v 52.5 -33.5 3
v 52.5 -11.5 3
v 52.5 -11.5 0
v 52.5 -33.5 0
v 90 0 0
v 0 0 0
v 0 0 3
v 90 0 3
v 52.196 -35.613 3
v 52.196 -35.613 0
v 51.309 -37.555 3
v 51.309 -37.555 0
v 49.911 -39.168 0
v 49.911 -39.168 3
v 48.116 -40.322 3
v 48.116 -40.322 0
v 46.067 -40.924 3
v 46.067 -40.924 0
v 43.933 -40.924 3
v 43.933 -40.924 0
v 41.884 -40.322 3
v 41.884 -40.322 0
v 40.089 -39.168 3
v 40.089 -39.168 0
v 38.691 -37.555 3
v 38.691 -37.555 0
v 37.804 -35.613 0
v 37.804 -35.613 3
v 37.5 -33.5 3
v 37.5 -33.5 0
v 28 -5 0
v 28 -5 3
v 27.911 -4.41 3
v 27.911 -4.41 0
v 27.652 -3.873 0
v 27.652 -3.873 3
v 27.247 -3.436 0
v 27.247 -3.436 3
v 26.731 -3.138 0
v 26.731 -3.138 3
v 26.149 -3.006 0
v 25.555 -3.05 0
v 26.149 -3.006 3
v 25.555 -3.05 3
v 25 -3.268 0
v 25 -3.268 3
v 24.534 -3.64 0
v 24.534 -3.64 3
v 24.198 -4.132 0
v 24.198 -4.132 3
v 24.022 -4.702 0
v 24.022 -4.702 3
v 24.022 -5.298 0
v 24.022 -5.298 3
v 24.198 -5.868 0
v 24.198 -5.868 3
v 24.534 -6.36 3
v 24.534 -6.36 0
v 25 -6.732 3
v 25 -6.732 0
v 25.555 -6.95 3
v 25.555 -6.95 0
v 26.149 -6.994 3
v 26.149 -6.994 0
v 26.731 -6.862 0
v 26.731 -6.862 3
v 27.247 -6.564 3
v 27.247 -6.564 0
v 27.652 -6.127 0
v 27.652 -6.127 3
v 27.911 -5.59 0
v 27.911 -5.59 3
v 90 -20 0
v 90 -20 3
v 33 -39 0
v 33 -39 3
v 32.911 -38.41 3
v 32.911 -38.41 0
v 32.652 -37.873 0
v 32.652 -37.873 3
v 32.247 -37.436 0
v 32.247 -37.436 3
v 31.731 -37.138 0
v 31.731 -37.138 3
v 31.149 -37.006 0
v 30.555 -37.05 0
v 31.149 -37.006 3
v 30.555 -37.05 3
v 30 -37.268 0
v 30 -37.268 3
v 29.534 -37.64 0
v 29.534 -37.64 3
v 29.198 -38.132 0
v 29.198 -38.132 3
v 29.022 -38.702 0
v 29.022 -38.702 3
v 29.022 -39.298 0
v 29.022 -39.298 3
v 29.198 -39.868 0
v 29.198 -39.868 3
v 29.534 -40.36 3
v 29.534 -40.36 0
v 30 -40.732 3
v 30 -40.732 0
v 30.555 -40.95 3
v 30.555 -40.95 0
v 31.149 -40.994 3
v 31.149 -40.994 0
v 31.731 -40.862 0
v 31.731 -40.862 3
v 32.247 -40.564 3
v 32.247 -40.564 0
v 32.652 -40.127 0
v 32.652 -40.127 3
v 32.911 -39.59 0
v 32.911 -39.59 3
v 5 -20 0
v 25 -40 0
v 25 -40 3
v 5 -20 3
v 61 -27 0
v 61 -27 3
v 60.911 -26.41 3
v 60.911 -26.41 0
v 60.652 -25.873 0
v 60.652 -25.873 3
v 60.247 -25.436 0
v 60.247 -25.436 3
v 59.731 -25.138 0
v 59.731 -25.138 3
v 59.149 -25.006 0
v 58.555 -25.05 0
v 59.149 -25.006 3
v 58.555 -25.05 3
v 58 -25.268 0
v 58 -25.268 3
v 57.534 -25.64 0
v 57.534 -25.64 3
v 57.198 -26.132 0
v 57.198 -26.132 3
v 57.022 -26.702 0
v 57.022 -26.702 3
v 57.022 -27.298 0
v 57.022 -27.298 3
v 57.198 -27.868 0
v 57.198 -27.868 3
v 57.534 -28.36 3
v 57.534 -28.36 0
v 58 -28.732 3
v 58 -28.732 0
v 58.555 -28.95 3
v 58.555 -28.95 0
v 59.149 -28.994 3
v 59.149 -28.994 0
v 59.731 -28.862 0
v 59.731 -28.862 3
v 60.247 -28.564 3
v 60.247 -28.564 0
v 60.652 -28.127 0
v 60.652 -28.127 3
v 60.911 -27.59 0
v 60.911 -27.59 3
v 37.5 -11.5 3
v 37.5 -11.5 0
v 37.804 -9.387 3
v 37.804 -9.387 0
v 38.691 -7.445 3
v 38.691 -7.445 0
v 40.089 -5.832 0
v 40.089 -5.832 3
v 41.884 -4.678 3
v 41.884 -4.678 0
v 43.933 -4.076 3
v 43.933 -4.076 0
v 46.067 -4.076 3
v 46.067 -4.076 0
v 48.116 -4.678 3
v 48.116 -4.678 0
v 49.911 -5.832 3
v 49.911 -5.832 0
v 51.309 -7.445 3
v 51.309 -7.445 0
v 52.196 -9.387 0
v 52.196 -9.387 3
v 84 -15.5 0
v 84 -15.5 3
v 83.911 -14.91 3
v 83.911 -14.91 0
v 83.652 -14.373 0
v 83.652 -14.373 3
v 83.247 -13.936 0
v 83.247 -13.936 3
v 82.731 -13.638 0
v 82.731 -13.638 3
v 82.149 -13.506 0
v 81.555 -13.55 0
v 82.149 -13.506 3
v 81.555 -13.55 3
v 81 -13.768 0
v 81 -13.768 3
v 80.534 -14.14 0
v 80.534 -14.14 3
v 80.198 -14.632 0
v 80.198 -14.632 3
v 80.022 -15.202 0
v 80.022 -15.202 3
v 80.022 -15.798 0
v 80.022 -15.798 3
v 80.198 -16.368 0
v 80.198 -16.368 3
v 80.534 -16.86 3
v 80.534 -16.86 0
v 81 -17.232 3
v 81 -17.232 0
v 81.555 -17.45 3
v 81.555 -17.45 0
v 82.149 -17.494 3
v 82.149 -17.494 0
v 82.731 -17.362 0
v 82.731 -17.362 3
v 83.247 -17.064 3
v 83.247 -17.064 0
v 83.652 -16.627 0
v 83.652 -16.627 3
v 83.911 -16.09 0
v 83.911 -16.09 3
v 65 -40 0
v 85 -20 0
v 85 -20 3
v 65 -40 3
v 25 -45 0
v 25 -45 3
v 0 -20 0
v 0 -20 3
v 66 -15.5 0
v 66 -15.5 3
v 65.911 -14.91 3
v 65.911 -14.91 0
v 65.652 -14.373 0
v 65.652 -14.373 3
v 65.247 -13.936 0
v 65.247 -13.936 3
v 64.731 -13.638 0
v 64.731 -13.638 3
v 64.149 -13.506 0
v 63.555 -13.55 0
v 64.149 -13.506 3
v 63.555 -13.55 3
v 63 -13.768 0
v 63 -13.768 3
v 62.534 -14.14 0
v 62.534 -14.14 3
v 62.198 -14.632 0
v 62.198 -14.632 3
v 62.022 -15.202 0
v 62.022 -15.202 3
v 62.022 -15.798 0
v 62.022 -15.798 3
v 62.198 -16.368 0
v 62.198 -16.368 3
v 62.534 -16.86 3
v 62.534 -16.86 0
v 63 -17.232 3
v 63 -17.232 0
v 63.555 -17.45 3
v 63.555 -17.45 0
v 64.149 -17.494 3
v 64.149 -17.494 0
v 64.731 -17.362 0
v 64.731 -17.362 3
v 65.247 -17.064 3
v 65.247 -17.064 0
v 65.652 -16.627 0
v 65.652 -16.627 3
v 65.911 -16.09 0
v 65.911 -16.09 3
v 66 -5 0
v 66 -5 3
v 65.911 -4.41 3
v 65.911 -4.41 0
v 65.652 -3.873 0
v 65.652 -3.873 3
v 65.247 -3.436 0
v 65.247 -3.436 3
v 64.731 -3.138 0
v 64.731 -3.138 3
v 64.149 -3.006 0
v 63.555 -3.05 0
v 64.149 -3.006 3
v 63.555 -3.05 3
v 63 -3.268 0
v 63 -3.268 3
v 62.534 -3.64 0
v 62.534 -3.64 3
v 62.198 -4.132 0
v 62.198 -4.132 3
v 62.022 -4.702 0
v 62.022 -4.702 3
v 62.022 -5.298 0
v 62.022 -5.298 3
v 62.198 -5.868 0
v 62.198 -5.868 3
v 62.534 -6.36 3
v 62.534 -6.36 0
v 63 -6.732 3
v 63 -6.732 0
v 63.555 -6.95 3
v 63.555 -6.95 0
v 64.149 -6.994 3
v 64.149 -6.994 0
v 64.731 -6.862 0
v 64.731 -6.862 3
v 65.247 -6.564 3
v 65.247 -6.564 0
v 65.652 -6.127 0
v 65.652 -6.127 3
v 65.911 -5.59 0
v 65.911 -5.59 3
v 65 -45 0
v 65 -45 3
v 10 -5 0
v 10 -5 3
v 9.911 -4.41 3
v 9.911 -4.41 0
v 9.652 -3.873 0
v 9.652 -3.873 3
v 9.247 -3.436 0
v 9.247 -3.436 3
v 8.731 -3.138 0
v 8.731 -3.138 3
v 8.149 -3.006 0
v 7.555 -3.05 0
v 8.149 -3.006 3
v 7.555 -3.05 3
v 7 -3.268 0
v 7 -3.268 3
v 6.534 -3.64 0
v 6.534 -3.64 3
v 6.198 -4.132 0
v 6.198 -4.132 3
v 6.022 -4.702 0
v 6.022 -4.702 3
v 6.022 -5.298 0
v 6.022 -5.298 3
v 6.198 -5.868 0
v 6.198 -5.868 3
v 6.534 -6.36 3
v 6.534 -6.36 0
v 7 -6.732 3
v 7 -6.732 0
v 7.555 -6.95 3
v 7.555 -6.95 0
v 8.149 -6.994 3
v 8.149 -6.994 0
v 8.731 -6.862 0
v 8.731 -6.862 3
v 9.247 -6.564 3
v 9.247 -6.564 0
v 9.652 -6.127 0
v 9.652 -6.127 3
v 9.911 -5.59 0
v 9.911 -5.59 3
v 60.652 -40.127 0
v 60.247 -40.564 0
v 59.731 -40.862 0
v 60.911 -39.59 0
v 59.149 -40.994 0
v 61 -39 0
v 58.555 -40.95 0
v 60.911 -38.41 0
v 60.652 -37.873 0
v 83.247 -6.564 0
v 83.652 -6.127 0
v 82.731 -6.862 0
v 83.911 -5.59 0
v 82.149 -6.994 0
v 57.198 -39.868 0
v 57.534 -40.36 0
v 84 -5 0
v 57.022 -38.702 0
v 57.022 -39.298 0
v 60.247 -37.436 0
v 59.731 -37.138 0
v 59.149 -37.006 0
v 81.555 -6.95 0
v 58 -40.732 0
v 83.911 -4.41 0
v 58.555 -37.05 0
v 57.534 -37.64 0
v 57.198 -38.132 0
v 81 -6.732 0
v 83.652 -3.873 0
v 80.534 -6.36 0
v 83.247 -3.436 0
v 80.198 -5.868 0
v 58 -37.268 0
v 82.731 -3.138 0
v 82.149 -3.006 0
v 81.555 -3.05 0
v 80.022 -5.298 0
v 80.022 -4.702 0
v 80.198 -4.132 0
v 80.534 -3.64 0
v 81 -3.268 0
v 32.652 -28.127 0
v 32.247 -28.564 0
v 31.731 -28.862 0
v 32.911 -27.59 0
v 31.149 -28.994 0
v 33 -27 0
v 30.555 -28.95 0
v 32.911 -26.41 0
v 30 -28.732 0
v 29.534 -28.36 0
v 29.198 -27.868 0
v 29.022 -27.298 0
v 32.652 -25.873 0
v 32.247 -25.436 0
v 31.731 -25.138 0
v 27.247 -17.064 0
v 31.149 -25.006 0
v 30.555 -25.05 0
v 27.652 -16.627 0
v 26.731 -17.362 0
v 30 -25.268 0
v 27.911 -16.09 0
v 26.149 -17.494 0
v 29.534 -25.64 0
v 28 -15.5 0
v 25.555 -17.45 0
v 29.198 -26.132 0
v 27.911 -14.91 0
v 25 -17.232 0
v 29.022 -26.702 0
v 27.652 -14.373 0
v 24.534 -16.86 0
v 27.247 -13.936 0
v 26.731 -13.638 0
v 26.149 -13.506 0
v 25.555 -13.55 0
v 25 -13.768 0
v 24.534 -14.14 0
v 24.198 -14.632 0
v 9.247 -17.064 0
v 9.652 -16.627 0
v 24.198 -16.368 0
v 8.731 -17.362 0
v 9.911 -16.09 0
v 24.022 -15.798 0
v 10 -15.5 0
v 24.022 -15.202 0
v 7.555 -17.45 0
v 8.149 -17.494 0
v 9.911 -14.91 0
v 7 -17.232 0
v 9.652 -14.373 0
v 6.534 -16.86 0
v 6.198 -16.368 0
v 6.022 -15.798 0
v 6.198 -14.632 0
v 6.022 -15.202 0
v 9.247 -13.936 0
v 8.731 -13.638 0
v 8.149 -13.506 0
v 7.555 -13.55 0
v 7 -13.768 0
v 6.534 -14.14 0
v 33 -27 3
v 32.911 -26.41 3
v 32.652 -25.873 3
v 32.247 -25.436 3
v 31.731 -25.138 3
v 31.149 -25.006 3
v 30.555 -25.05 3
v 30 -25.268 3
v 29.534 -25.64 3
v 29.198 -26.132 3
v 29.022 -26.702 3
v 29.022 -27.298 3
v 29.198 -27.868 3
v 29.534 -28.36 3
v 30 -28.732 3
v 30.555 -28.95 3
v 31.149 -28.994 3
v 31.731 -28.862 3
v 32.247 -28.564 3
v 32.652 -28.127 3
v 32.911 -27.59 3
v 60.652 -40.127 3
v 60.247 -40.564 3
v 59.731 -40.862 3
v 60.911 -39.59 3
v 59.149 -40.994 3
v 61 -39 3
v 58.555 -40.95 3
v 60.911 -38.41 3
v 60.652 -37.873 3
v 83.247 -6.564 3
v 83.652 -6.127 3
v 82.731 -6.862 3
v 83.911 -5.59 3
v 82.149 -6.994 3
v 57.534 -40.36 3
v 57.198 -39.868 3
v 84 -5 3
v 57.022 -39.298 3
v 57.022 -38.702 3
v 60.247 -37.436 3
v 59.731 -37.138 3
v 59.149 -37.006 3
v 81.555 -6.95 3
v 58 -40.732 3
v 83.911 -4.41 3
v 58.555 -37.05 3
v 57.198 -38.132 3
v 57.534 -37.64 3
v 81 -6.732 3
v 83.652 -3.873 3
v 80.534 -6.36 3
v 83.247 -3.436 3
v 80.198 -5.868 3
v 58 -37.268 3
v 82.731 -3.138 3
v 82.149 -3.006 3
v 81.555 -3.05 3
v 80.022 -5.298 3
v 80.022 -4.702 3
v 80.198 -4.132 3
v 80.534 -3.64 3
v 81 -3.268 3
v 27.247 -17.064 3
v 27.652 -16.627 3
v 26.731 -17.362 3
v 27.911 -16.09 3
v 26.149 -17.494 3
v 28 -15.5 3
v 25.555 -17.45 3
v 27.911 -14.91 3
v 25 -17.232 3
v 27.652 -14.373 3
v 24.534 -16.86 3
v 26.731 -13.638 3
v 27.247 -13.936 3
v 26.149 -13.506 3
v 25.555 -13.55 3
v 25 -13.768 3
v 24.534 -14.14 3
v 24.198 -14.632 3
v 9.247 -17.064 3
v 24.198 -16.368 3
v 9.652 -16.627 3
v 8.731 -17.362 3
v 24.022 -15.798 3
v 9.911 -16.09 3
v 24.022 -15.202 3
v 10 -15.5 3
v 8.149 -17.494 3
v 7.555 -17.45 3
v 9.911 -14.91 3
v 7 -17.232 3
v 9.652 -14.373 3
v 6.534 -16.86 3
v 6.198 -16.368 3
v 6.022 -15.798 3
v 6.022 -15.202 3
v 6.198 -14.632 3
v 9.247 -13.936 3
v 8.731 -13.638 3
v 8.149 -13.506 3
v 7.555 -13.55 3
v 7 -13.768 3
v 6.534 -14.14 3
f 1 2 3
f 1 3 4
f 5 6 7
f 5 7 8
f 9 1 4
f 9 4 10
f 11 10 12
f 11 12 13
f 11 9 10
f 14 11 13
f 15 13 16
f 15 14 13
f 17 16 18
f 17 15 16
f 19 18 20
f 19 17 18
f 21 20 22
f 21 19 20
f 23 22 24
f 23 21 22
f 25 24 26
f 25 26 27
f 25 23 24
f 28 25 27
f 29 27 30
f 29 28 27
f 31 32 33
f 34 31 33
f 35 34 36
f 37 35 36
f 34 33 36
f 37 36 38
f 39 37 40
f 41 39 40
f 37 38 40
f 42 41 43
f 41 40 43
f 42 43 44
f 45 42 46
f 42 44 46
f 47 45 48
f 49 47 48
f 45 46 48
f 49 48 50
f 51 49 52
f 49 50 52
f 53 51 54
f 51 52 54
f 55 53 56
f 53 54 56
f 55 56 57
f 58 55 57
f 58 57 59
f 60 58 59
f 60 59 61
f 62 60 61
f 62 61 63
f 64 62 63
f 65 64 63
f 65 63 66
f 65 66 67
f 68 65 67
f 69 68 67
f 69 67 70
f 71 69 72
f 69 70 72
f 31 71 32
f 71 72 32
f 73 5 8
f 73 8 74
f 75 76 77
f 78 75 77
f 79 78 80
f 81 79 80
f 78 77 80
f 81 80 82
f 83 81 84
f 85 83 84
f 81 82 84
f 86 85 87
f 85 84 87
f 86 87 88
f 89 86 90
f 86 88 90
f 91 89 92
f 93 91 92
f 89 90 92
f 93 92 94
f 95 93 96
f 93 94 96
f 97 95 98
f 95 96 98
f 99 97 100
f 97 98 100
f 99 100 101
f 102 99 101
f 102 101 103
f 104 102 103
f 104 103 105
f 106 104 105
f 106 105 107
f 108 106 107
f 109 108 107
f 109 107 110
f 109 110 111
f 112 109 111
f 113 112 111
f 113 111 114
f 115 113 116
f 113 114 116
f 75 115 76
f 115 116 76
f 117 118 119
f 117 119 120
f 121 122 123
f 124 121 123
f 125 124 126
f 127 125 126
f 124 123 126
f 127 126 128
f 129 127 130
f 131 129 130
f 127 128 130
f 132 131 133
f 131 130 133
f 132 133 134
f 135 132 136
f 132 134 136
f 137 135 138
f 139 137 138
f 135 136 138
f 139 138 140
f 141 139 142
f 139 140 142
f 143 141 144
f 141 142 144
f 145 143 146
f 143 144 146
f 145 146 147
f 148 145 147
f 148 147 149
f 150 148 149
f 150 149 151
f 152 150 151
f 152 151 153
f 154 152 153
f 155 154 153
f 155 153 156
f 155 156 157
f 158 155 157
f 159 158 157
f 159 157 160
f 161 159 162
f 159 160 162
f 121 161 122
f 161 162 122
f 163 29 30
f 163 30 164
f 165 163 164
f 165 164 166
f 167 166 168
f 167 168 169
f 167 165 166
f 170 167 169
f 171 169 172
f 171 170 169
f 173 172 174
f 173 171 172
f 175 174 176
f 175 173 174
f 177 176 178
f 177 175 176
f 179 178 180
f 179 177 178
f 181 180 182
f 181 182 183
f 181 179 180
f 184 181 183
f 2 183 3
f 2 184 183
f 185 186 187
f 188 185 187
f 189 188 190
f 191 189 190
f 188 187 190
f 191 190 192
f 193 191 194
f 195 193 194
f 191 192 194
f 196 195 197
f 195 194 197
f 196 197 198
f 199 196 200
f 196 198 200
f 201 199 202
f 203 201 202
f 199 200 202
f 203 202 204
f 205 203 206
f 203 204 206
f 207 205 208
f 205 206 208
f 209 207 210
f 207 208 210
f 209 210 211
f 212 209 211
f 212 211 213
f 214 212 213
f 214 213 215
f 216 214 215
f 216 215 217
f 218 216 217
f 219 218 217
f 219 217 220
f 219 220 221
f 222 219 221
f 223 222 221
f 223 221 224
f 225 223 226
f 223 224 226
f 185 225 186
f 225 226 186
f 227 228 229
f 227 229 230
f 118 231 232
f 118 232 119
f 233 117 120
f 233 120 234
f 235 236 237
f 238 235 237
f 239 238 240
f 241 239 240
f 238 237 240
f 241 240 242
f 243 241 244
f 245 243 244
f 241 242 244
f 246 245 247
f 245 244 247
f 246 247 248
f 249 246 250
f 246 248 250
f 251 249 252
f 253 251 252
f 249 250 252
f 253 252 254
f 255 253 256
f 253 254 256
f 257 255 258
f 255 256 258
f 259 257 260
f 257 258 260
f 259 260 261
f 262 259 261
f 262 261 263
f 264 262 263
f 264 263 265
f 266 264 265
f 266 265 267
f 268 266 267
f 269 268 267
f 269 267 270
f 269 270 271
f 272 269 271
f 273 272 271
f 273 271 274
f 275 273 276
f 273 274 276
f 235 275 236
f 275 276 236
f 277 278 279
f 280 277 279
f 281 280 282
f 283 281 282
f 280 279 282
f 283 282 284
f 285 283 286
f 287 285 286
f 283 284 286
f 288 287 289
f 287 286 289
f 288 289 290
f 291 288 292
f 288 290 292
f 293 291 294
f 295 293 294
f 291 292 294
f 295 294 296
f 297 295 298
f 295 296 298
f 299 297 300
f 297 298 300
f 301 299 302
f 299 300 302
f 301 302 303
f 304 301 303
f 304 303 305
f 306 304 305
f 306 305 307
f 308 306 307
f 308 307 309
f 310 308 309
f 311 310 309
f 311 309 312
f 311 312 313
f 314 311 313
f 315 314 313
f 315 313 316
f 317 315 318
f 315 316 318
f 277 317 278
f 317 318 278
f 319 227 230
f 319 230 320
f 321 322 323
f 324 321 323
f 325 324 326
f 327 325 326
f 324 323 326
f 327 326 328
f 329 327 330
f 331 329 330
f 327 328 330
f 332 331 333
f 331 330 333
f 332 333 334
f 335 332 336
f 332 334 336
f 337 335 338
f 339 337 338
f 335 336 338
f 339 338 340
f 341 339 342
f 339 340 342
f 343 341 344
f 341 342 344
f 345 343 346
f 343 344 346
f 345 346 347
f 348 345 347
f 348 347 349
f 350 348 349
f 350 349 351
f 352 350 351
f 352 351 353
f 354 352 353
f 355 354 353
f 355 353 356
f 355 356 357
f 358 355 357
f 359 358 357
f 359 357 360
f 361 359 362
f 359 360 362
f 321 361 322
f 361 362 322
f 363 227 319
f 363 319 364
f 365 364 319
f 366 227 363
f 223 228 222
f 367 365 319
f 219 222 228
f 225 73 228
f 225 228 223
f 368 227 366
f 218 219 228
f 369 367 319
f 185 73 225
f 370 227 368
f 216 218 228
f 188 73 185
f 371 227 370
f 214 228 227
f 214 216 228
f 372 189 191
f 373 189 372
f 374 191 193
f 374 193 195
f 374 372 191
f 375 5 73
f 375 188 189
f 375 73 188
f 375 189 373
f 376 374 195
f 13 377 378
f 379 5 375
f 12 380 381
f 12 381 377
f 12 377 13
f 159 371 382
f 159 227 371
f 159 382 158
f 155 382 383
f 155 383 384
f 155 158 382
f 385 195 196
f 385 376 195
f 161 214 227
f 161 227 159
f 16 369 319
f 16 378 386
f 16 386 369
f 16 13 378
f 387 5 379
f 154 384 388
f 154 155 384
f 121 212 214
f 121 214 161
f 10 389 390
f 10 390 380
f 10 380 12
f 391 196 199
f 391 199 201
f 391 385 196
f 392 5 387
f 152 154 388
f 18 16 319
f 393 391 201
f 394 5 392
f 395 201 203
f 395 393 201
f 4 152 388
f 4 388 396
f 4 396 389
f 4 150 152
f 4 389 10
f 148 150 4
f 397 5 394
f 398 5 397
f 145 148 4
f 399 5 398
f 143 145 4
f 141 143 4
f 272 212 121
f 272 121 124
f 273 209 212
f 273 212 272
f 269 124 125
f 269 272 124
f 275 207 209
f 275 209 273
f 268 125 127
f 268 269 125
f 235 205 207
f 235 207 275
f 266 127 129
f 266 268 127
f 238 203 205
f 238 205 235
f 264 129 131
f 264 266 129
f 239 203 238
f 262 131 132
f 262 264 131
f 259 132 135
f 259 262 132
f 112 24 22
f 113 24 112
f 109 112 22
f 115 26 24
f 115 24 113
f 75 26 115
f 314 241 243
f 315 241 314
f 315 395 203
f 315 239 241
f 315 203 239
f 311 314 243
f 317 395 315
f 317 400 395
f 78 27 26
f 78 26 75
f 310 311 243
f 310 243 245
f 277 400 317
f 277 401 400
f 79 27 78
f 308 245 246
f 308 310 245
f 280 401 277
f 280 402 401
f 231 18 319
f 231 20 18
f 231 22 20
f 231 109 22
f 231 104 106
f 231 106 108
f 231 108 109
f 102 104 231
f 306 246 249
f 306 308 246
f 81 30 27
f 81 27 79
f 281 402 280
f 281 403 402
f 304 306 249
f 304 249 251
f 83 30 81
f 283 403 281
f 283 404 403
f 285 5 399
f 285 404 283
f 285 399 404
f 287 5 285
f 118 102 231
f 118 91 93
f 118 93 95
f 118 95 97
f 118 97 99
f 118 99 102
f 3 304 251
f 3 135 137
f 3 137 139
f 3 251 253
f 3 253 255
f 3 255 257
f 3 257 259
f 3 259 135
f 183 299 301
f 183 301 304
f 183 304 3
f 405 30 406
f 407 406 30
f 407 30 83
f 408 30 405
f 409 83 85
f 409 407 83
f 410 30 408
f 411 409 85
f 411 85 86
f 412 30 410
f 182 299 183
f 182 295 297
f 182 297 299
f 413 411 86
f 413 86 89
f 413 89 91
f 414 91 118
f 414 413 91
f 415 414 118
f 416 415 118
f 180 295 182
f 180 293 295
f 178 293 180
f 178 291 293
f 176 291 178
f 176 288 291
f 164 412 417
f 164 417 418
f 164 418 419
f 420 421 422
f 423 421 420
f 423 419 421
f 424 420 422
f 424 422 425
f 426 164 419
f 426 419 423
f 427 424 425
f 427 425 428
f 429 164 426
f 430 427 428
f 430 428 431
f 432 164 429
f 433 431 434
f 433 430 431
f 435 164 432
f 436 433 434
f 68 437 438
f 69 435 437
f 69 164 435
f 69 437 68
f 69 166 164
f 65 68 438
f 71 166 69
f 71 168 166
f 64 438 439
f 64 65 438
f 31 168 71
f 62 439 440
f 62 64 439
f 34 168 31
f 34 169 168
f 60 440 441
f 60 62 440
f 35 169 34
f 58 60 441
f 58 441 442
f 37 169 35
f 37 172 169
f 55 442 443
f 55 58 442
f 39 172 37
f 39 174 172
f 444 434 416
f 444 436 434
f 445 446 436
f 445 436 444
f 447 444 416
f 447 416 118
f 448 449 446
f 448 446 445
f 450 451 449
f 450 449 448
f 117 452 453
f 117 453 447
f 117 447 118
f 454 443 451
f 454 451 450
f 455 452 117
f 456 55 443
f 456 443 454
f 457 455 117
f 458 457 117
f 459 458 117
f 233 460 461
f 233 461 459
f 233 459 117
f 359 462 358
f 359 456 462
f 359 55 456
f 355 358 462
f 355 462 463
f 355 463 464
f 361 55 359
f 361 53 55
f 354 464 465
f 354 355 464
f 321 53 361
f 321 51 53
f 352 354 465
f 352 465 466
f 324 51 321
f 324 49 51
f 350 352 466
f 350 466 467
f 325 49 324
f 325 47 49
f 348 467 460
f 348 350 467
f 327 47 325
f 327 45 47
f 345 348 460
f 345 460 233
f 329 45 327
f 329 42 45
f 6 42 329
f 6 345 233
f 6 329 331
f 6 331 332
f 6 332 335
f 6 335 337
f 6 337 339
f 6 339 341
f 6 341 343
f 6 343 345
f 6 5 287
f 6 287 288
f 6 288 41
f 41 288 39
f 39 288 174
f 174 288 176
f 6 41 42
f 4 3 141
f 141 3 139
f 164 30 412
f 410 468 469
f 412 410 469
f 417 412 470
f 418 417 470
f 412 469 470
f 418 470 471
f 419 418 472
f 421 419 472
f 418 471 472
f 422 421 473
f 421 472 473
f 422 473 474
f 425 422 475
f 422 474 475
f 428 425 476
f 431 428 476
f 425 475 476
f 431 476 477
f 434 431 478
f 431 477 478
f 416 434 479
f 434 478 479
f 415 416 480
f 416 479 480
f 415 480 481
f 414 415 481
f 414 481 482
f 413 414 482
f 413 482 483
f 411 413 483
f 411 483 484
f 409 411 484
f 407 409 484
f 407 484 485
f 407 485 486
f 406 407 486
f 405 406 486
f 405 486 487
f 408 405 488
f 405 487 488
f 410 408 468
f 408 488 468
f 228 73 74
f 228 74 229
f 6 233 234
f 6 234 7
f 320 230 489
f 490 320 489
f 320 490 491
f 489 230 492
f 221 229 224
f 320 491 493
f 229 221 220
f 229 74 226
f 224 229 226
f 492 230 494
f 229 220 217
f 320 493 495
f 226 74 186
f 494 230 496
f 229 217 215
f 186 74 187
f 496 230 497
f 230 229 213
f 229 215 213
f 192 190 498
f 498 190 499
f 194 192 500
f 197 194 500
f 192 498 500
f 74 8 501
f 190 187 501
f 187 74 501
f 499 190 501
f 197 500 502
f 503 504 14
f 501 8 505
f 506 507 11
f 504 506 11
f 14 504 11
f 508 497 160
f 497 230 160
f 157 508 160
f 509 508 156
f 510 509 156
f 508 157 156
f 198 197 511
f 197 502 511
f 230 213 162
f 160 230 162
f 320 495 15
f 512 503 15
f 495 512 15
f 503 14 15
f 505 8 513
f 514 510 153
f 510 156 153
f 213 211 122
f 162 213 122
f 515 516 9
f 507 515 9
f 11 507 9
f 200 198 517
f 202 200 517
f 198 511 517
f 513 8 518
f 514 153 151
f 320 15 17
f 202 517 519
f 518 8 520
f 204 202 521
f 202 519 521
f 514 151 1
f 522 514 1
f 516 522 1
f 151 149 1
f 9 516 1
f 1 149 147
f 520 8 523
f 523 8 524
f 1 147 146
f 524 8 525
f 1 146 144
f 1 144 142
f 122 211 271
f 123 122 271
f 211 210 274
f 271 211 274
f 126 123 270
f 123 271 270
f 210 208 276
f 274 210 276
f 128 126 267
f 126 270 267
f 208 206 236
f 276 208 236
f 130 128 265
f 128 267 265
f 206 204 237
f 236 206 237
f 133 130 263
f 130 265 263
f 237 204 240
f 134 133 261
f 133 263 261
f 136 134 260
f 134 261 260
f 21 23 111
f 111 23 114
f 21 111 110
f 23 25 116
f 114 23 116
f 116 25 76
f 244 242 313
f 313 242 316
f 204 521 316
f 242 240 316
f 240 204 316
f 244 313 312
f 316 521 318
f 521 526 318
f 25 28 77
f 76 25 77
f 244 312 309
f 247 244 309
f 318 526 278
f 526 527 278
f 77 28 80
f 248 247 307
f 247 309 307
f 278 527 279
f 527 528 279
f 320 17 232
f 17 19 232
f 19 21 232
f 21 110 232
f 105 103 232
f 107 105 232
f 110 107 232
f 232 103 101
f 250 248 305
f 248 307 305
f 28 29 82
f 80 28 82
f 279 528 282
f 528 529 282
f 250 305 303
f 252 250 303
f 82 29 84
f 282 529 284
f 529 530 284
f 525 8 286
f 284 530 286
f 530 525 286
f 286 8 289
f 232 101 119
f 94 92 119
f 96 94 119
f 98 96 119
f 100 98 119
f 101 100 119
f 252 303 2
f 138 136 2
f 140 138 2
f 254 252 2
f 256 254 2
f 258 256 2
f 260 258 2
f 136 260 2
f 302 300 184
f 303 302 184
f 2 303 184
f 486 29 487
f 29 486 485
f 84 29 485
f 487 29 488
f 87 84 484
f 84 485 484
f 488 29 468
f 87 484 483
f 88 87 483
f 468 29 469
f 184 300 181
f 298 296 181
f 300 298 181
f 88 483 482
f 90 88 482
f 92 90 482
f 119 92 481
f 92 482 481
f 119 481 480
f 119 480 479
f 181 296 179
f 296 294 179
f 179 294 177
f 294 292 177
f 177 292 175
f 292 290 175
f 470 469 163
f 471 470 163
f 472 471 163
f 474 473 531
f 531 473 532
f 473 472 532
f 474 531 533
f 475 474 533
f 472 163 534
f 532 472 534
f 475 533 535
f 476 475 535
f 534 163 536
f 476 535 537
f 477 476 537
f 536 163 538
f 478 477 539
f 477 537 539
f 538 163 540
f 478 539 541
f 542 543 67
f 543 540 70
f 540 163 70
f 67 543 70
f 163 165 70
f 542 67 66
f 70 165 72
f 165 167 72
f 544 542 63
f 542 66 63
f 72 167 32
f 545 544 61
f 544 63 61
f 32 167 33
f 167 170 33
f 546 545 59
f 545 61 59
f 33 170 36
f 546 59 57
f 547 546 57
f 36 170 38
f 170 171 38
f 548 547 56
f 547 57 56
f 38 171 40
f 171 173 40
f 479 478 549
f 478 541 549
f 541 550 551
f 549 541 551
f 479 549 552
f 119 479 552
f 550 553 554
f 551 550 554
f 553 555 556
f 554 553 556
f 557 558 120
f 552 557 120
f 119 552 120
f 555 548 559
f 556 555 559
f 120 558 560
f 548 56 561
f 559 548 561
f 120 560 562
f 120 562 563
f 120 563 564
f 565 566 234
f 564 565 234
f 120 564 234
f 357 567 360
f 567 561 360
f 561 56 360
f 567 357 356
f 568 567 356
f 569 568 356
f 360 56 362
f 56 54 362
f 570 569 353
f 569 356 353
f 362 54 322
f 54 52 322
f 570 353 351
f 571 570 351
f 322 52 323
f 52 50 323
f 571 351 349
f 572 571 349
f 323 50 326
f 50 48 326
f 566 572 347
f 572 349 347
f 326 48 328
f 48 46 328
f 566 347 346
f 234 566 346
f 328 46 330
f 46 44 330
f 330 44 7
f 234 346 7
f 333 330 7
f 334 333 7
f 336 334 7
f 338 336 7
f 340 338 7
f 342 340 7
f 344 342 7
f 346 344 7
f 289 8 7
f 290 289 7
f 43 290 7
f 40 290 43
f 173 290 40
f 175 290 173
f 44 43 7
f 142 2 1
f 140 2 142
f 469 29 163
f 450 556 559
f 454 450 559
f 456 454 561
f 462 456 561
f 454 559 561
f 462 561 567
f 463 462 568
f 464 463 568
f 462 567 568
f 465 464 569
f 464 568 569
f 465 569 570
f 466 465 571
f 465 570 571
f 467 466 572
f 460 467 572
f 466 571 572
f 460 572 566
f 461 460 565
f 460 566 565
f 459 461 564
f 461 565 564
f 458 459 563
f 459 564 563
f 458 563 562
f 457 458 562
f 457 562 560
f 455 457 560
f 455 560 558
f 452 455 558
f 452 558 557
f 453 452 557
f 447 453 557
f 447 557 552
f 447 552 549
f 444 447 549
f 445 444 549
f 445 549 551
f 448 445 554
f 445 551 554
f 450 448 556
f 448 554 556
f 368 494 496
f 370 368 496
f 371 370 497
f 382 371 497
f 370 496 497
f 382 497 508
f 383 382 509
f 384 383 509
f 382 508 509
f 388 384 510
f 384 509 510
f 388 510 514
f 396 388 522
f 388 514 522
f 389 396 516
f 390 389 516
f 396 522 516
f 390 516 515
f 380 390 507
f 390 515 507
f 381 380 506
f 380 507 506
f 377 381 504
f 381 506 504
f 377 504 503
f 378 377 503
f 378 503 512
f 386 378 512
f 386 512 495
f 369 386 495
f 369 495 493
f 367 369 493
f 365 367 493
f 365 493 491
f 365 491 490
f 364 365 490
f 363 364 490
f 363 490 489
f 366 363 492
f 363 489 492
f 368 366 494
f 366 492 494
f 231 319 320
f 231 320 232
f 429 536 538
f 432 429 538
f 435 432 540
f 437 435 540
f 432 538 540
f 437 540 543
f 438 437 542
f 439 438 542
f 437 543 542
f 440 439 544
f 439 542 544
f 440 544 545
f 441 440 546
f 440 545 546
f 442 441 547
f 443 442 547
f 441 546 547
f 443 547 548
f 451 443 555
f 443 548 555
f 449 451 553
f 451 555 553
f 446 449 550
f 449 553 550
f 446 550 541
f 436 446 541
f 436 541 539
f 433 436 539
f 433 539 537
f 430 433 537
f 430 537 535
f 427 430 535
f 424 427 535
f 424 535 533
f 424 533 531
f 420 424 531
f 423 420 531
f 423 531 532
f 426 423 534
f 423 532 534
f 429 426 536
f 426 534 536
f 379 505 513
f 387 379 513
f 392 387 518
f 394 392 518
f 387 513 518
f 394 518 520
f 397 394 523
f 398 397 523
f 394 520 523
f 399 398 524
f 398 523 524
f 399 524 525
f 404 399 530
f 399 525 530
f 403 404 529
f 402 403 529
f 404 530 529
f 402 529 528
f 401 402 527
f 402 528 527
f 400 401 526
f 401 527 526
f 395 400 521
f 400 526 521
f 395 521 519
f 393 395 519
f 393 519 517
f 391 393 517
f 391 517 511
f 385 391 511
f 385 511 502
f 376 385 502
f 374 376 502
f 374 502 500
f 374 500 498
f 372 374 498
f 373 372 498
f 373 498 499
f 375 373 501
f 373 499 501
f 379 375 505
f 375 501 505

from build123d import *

# Parameters (mm, degrees)
EXTRUDE_1_DEPTH     = 3
SKETCH_2_R          = 2
CUT_EXTRUDE_1_DEPTH = 3


with BuildPart() as part:
    # 草图1 → 凸台-拉伸1 (new body)
    with BuildSketch(Plane.XY):
        Polygon((0, 0), (90, 0), (90, -20), (85, -20), (65, -40), (65, -45), (25, -45), (25, -40), (5, -20), (0, -20), align=None)
    extrude(amount=EXTRUDE_1_DEPTH)

    # 草图2 → 切除-拉伸1 (cut)
    with BuildSketch(Plane.XY.offset(3)):
        with Locations((82, -5)):
            Circle(SKETCH_2_R)
        with Locations((82, -15.5)):
            Circle(SKETCH_2_R)
        with Locations((64, -15.5)):
            Circle(SKETCH_2_R)
        with Locations((64, -5)):
            Circle(SKETCH_2_R)
        with Locations((26, -5)):
            Circle(SKETCH_2_R)
        with Locations((26, -15.5)):
            Circle(SKETCH_2_R)
        with Locations((8, -5)):
            Circle(SKETCH_2_R)
        with Locations((8, -15.5)):
            Circle(SKETCH_2_R)
        with Locations((31, -27)):
            Circle(SKETCH_2_R)
        with Locations((31, -39)):
            Circle(SKETCH_2_R)
        with Locations((59, -27)):
            Circle(SKETCH_2_R)
        with Locations((59, -39)):
            Circle(SKETCH_2_R)
        with BuildLine():
            Line((52.5, -11.5), (52.5, -33.5))
            ThreePointArc((52.5, -33.5), (45, -41), (37.5, -33.5))
            Line((37.5, -33.5), (37.5, -11.5))
            ThreePointArc((37.5, -11.5), (45, -4), (52.5, -11.5))
        make_face()
    extrude(amount=-CUT_EXTRUDE_1_DEPTH, mode=Mode.SUBTRACT)


solid = part.part
